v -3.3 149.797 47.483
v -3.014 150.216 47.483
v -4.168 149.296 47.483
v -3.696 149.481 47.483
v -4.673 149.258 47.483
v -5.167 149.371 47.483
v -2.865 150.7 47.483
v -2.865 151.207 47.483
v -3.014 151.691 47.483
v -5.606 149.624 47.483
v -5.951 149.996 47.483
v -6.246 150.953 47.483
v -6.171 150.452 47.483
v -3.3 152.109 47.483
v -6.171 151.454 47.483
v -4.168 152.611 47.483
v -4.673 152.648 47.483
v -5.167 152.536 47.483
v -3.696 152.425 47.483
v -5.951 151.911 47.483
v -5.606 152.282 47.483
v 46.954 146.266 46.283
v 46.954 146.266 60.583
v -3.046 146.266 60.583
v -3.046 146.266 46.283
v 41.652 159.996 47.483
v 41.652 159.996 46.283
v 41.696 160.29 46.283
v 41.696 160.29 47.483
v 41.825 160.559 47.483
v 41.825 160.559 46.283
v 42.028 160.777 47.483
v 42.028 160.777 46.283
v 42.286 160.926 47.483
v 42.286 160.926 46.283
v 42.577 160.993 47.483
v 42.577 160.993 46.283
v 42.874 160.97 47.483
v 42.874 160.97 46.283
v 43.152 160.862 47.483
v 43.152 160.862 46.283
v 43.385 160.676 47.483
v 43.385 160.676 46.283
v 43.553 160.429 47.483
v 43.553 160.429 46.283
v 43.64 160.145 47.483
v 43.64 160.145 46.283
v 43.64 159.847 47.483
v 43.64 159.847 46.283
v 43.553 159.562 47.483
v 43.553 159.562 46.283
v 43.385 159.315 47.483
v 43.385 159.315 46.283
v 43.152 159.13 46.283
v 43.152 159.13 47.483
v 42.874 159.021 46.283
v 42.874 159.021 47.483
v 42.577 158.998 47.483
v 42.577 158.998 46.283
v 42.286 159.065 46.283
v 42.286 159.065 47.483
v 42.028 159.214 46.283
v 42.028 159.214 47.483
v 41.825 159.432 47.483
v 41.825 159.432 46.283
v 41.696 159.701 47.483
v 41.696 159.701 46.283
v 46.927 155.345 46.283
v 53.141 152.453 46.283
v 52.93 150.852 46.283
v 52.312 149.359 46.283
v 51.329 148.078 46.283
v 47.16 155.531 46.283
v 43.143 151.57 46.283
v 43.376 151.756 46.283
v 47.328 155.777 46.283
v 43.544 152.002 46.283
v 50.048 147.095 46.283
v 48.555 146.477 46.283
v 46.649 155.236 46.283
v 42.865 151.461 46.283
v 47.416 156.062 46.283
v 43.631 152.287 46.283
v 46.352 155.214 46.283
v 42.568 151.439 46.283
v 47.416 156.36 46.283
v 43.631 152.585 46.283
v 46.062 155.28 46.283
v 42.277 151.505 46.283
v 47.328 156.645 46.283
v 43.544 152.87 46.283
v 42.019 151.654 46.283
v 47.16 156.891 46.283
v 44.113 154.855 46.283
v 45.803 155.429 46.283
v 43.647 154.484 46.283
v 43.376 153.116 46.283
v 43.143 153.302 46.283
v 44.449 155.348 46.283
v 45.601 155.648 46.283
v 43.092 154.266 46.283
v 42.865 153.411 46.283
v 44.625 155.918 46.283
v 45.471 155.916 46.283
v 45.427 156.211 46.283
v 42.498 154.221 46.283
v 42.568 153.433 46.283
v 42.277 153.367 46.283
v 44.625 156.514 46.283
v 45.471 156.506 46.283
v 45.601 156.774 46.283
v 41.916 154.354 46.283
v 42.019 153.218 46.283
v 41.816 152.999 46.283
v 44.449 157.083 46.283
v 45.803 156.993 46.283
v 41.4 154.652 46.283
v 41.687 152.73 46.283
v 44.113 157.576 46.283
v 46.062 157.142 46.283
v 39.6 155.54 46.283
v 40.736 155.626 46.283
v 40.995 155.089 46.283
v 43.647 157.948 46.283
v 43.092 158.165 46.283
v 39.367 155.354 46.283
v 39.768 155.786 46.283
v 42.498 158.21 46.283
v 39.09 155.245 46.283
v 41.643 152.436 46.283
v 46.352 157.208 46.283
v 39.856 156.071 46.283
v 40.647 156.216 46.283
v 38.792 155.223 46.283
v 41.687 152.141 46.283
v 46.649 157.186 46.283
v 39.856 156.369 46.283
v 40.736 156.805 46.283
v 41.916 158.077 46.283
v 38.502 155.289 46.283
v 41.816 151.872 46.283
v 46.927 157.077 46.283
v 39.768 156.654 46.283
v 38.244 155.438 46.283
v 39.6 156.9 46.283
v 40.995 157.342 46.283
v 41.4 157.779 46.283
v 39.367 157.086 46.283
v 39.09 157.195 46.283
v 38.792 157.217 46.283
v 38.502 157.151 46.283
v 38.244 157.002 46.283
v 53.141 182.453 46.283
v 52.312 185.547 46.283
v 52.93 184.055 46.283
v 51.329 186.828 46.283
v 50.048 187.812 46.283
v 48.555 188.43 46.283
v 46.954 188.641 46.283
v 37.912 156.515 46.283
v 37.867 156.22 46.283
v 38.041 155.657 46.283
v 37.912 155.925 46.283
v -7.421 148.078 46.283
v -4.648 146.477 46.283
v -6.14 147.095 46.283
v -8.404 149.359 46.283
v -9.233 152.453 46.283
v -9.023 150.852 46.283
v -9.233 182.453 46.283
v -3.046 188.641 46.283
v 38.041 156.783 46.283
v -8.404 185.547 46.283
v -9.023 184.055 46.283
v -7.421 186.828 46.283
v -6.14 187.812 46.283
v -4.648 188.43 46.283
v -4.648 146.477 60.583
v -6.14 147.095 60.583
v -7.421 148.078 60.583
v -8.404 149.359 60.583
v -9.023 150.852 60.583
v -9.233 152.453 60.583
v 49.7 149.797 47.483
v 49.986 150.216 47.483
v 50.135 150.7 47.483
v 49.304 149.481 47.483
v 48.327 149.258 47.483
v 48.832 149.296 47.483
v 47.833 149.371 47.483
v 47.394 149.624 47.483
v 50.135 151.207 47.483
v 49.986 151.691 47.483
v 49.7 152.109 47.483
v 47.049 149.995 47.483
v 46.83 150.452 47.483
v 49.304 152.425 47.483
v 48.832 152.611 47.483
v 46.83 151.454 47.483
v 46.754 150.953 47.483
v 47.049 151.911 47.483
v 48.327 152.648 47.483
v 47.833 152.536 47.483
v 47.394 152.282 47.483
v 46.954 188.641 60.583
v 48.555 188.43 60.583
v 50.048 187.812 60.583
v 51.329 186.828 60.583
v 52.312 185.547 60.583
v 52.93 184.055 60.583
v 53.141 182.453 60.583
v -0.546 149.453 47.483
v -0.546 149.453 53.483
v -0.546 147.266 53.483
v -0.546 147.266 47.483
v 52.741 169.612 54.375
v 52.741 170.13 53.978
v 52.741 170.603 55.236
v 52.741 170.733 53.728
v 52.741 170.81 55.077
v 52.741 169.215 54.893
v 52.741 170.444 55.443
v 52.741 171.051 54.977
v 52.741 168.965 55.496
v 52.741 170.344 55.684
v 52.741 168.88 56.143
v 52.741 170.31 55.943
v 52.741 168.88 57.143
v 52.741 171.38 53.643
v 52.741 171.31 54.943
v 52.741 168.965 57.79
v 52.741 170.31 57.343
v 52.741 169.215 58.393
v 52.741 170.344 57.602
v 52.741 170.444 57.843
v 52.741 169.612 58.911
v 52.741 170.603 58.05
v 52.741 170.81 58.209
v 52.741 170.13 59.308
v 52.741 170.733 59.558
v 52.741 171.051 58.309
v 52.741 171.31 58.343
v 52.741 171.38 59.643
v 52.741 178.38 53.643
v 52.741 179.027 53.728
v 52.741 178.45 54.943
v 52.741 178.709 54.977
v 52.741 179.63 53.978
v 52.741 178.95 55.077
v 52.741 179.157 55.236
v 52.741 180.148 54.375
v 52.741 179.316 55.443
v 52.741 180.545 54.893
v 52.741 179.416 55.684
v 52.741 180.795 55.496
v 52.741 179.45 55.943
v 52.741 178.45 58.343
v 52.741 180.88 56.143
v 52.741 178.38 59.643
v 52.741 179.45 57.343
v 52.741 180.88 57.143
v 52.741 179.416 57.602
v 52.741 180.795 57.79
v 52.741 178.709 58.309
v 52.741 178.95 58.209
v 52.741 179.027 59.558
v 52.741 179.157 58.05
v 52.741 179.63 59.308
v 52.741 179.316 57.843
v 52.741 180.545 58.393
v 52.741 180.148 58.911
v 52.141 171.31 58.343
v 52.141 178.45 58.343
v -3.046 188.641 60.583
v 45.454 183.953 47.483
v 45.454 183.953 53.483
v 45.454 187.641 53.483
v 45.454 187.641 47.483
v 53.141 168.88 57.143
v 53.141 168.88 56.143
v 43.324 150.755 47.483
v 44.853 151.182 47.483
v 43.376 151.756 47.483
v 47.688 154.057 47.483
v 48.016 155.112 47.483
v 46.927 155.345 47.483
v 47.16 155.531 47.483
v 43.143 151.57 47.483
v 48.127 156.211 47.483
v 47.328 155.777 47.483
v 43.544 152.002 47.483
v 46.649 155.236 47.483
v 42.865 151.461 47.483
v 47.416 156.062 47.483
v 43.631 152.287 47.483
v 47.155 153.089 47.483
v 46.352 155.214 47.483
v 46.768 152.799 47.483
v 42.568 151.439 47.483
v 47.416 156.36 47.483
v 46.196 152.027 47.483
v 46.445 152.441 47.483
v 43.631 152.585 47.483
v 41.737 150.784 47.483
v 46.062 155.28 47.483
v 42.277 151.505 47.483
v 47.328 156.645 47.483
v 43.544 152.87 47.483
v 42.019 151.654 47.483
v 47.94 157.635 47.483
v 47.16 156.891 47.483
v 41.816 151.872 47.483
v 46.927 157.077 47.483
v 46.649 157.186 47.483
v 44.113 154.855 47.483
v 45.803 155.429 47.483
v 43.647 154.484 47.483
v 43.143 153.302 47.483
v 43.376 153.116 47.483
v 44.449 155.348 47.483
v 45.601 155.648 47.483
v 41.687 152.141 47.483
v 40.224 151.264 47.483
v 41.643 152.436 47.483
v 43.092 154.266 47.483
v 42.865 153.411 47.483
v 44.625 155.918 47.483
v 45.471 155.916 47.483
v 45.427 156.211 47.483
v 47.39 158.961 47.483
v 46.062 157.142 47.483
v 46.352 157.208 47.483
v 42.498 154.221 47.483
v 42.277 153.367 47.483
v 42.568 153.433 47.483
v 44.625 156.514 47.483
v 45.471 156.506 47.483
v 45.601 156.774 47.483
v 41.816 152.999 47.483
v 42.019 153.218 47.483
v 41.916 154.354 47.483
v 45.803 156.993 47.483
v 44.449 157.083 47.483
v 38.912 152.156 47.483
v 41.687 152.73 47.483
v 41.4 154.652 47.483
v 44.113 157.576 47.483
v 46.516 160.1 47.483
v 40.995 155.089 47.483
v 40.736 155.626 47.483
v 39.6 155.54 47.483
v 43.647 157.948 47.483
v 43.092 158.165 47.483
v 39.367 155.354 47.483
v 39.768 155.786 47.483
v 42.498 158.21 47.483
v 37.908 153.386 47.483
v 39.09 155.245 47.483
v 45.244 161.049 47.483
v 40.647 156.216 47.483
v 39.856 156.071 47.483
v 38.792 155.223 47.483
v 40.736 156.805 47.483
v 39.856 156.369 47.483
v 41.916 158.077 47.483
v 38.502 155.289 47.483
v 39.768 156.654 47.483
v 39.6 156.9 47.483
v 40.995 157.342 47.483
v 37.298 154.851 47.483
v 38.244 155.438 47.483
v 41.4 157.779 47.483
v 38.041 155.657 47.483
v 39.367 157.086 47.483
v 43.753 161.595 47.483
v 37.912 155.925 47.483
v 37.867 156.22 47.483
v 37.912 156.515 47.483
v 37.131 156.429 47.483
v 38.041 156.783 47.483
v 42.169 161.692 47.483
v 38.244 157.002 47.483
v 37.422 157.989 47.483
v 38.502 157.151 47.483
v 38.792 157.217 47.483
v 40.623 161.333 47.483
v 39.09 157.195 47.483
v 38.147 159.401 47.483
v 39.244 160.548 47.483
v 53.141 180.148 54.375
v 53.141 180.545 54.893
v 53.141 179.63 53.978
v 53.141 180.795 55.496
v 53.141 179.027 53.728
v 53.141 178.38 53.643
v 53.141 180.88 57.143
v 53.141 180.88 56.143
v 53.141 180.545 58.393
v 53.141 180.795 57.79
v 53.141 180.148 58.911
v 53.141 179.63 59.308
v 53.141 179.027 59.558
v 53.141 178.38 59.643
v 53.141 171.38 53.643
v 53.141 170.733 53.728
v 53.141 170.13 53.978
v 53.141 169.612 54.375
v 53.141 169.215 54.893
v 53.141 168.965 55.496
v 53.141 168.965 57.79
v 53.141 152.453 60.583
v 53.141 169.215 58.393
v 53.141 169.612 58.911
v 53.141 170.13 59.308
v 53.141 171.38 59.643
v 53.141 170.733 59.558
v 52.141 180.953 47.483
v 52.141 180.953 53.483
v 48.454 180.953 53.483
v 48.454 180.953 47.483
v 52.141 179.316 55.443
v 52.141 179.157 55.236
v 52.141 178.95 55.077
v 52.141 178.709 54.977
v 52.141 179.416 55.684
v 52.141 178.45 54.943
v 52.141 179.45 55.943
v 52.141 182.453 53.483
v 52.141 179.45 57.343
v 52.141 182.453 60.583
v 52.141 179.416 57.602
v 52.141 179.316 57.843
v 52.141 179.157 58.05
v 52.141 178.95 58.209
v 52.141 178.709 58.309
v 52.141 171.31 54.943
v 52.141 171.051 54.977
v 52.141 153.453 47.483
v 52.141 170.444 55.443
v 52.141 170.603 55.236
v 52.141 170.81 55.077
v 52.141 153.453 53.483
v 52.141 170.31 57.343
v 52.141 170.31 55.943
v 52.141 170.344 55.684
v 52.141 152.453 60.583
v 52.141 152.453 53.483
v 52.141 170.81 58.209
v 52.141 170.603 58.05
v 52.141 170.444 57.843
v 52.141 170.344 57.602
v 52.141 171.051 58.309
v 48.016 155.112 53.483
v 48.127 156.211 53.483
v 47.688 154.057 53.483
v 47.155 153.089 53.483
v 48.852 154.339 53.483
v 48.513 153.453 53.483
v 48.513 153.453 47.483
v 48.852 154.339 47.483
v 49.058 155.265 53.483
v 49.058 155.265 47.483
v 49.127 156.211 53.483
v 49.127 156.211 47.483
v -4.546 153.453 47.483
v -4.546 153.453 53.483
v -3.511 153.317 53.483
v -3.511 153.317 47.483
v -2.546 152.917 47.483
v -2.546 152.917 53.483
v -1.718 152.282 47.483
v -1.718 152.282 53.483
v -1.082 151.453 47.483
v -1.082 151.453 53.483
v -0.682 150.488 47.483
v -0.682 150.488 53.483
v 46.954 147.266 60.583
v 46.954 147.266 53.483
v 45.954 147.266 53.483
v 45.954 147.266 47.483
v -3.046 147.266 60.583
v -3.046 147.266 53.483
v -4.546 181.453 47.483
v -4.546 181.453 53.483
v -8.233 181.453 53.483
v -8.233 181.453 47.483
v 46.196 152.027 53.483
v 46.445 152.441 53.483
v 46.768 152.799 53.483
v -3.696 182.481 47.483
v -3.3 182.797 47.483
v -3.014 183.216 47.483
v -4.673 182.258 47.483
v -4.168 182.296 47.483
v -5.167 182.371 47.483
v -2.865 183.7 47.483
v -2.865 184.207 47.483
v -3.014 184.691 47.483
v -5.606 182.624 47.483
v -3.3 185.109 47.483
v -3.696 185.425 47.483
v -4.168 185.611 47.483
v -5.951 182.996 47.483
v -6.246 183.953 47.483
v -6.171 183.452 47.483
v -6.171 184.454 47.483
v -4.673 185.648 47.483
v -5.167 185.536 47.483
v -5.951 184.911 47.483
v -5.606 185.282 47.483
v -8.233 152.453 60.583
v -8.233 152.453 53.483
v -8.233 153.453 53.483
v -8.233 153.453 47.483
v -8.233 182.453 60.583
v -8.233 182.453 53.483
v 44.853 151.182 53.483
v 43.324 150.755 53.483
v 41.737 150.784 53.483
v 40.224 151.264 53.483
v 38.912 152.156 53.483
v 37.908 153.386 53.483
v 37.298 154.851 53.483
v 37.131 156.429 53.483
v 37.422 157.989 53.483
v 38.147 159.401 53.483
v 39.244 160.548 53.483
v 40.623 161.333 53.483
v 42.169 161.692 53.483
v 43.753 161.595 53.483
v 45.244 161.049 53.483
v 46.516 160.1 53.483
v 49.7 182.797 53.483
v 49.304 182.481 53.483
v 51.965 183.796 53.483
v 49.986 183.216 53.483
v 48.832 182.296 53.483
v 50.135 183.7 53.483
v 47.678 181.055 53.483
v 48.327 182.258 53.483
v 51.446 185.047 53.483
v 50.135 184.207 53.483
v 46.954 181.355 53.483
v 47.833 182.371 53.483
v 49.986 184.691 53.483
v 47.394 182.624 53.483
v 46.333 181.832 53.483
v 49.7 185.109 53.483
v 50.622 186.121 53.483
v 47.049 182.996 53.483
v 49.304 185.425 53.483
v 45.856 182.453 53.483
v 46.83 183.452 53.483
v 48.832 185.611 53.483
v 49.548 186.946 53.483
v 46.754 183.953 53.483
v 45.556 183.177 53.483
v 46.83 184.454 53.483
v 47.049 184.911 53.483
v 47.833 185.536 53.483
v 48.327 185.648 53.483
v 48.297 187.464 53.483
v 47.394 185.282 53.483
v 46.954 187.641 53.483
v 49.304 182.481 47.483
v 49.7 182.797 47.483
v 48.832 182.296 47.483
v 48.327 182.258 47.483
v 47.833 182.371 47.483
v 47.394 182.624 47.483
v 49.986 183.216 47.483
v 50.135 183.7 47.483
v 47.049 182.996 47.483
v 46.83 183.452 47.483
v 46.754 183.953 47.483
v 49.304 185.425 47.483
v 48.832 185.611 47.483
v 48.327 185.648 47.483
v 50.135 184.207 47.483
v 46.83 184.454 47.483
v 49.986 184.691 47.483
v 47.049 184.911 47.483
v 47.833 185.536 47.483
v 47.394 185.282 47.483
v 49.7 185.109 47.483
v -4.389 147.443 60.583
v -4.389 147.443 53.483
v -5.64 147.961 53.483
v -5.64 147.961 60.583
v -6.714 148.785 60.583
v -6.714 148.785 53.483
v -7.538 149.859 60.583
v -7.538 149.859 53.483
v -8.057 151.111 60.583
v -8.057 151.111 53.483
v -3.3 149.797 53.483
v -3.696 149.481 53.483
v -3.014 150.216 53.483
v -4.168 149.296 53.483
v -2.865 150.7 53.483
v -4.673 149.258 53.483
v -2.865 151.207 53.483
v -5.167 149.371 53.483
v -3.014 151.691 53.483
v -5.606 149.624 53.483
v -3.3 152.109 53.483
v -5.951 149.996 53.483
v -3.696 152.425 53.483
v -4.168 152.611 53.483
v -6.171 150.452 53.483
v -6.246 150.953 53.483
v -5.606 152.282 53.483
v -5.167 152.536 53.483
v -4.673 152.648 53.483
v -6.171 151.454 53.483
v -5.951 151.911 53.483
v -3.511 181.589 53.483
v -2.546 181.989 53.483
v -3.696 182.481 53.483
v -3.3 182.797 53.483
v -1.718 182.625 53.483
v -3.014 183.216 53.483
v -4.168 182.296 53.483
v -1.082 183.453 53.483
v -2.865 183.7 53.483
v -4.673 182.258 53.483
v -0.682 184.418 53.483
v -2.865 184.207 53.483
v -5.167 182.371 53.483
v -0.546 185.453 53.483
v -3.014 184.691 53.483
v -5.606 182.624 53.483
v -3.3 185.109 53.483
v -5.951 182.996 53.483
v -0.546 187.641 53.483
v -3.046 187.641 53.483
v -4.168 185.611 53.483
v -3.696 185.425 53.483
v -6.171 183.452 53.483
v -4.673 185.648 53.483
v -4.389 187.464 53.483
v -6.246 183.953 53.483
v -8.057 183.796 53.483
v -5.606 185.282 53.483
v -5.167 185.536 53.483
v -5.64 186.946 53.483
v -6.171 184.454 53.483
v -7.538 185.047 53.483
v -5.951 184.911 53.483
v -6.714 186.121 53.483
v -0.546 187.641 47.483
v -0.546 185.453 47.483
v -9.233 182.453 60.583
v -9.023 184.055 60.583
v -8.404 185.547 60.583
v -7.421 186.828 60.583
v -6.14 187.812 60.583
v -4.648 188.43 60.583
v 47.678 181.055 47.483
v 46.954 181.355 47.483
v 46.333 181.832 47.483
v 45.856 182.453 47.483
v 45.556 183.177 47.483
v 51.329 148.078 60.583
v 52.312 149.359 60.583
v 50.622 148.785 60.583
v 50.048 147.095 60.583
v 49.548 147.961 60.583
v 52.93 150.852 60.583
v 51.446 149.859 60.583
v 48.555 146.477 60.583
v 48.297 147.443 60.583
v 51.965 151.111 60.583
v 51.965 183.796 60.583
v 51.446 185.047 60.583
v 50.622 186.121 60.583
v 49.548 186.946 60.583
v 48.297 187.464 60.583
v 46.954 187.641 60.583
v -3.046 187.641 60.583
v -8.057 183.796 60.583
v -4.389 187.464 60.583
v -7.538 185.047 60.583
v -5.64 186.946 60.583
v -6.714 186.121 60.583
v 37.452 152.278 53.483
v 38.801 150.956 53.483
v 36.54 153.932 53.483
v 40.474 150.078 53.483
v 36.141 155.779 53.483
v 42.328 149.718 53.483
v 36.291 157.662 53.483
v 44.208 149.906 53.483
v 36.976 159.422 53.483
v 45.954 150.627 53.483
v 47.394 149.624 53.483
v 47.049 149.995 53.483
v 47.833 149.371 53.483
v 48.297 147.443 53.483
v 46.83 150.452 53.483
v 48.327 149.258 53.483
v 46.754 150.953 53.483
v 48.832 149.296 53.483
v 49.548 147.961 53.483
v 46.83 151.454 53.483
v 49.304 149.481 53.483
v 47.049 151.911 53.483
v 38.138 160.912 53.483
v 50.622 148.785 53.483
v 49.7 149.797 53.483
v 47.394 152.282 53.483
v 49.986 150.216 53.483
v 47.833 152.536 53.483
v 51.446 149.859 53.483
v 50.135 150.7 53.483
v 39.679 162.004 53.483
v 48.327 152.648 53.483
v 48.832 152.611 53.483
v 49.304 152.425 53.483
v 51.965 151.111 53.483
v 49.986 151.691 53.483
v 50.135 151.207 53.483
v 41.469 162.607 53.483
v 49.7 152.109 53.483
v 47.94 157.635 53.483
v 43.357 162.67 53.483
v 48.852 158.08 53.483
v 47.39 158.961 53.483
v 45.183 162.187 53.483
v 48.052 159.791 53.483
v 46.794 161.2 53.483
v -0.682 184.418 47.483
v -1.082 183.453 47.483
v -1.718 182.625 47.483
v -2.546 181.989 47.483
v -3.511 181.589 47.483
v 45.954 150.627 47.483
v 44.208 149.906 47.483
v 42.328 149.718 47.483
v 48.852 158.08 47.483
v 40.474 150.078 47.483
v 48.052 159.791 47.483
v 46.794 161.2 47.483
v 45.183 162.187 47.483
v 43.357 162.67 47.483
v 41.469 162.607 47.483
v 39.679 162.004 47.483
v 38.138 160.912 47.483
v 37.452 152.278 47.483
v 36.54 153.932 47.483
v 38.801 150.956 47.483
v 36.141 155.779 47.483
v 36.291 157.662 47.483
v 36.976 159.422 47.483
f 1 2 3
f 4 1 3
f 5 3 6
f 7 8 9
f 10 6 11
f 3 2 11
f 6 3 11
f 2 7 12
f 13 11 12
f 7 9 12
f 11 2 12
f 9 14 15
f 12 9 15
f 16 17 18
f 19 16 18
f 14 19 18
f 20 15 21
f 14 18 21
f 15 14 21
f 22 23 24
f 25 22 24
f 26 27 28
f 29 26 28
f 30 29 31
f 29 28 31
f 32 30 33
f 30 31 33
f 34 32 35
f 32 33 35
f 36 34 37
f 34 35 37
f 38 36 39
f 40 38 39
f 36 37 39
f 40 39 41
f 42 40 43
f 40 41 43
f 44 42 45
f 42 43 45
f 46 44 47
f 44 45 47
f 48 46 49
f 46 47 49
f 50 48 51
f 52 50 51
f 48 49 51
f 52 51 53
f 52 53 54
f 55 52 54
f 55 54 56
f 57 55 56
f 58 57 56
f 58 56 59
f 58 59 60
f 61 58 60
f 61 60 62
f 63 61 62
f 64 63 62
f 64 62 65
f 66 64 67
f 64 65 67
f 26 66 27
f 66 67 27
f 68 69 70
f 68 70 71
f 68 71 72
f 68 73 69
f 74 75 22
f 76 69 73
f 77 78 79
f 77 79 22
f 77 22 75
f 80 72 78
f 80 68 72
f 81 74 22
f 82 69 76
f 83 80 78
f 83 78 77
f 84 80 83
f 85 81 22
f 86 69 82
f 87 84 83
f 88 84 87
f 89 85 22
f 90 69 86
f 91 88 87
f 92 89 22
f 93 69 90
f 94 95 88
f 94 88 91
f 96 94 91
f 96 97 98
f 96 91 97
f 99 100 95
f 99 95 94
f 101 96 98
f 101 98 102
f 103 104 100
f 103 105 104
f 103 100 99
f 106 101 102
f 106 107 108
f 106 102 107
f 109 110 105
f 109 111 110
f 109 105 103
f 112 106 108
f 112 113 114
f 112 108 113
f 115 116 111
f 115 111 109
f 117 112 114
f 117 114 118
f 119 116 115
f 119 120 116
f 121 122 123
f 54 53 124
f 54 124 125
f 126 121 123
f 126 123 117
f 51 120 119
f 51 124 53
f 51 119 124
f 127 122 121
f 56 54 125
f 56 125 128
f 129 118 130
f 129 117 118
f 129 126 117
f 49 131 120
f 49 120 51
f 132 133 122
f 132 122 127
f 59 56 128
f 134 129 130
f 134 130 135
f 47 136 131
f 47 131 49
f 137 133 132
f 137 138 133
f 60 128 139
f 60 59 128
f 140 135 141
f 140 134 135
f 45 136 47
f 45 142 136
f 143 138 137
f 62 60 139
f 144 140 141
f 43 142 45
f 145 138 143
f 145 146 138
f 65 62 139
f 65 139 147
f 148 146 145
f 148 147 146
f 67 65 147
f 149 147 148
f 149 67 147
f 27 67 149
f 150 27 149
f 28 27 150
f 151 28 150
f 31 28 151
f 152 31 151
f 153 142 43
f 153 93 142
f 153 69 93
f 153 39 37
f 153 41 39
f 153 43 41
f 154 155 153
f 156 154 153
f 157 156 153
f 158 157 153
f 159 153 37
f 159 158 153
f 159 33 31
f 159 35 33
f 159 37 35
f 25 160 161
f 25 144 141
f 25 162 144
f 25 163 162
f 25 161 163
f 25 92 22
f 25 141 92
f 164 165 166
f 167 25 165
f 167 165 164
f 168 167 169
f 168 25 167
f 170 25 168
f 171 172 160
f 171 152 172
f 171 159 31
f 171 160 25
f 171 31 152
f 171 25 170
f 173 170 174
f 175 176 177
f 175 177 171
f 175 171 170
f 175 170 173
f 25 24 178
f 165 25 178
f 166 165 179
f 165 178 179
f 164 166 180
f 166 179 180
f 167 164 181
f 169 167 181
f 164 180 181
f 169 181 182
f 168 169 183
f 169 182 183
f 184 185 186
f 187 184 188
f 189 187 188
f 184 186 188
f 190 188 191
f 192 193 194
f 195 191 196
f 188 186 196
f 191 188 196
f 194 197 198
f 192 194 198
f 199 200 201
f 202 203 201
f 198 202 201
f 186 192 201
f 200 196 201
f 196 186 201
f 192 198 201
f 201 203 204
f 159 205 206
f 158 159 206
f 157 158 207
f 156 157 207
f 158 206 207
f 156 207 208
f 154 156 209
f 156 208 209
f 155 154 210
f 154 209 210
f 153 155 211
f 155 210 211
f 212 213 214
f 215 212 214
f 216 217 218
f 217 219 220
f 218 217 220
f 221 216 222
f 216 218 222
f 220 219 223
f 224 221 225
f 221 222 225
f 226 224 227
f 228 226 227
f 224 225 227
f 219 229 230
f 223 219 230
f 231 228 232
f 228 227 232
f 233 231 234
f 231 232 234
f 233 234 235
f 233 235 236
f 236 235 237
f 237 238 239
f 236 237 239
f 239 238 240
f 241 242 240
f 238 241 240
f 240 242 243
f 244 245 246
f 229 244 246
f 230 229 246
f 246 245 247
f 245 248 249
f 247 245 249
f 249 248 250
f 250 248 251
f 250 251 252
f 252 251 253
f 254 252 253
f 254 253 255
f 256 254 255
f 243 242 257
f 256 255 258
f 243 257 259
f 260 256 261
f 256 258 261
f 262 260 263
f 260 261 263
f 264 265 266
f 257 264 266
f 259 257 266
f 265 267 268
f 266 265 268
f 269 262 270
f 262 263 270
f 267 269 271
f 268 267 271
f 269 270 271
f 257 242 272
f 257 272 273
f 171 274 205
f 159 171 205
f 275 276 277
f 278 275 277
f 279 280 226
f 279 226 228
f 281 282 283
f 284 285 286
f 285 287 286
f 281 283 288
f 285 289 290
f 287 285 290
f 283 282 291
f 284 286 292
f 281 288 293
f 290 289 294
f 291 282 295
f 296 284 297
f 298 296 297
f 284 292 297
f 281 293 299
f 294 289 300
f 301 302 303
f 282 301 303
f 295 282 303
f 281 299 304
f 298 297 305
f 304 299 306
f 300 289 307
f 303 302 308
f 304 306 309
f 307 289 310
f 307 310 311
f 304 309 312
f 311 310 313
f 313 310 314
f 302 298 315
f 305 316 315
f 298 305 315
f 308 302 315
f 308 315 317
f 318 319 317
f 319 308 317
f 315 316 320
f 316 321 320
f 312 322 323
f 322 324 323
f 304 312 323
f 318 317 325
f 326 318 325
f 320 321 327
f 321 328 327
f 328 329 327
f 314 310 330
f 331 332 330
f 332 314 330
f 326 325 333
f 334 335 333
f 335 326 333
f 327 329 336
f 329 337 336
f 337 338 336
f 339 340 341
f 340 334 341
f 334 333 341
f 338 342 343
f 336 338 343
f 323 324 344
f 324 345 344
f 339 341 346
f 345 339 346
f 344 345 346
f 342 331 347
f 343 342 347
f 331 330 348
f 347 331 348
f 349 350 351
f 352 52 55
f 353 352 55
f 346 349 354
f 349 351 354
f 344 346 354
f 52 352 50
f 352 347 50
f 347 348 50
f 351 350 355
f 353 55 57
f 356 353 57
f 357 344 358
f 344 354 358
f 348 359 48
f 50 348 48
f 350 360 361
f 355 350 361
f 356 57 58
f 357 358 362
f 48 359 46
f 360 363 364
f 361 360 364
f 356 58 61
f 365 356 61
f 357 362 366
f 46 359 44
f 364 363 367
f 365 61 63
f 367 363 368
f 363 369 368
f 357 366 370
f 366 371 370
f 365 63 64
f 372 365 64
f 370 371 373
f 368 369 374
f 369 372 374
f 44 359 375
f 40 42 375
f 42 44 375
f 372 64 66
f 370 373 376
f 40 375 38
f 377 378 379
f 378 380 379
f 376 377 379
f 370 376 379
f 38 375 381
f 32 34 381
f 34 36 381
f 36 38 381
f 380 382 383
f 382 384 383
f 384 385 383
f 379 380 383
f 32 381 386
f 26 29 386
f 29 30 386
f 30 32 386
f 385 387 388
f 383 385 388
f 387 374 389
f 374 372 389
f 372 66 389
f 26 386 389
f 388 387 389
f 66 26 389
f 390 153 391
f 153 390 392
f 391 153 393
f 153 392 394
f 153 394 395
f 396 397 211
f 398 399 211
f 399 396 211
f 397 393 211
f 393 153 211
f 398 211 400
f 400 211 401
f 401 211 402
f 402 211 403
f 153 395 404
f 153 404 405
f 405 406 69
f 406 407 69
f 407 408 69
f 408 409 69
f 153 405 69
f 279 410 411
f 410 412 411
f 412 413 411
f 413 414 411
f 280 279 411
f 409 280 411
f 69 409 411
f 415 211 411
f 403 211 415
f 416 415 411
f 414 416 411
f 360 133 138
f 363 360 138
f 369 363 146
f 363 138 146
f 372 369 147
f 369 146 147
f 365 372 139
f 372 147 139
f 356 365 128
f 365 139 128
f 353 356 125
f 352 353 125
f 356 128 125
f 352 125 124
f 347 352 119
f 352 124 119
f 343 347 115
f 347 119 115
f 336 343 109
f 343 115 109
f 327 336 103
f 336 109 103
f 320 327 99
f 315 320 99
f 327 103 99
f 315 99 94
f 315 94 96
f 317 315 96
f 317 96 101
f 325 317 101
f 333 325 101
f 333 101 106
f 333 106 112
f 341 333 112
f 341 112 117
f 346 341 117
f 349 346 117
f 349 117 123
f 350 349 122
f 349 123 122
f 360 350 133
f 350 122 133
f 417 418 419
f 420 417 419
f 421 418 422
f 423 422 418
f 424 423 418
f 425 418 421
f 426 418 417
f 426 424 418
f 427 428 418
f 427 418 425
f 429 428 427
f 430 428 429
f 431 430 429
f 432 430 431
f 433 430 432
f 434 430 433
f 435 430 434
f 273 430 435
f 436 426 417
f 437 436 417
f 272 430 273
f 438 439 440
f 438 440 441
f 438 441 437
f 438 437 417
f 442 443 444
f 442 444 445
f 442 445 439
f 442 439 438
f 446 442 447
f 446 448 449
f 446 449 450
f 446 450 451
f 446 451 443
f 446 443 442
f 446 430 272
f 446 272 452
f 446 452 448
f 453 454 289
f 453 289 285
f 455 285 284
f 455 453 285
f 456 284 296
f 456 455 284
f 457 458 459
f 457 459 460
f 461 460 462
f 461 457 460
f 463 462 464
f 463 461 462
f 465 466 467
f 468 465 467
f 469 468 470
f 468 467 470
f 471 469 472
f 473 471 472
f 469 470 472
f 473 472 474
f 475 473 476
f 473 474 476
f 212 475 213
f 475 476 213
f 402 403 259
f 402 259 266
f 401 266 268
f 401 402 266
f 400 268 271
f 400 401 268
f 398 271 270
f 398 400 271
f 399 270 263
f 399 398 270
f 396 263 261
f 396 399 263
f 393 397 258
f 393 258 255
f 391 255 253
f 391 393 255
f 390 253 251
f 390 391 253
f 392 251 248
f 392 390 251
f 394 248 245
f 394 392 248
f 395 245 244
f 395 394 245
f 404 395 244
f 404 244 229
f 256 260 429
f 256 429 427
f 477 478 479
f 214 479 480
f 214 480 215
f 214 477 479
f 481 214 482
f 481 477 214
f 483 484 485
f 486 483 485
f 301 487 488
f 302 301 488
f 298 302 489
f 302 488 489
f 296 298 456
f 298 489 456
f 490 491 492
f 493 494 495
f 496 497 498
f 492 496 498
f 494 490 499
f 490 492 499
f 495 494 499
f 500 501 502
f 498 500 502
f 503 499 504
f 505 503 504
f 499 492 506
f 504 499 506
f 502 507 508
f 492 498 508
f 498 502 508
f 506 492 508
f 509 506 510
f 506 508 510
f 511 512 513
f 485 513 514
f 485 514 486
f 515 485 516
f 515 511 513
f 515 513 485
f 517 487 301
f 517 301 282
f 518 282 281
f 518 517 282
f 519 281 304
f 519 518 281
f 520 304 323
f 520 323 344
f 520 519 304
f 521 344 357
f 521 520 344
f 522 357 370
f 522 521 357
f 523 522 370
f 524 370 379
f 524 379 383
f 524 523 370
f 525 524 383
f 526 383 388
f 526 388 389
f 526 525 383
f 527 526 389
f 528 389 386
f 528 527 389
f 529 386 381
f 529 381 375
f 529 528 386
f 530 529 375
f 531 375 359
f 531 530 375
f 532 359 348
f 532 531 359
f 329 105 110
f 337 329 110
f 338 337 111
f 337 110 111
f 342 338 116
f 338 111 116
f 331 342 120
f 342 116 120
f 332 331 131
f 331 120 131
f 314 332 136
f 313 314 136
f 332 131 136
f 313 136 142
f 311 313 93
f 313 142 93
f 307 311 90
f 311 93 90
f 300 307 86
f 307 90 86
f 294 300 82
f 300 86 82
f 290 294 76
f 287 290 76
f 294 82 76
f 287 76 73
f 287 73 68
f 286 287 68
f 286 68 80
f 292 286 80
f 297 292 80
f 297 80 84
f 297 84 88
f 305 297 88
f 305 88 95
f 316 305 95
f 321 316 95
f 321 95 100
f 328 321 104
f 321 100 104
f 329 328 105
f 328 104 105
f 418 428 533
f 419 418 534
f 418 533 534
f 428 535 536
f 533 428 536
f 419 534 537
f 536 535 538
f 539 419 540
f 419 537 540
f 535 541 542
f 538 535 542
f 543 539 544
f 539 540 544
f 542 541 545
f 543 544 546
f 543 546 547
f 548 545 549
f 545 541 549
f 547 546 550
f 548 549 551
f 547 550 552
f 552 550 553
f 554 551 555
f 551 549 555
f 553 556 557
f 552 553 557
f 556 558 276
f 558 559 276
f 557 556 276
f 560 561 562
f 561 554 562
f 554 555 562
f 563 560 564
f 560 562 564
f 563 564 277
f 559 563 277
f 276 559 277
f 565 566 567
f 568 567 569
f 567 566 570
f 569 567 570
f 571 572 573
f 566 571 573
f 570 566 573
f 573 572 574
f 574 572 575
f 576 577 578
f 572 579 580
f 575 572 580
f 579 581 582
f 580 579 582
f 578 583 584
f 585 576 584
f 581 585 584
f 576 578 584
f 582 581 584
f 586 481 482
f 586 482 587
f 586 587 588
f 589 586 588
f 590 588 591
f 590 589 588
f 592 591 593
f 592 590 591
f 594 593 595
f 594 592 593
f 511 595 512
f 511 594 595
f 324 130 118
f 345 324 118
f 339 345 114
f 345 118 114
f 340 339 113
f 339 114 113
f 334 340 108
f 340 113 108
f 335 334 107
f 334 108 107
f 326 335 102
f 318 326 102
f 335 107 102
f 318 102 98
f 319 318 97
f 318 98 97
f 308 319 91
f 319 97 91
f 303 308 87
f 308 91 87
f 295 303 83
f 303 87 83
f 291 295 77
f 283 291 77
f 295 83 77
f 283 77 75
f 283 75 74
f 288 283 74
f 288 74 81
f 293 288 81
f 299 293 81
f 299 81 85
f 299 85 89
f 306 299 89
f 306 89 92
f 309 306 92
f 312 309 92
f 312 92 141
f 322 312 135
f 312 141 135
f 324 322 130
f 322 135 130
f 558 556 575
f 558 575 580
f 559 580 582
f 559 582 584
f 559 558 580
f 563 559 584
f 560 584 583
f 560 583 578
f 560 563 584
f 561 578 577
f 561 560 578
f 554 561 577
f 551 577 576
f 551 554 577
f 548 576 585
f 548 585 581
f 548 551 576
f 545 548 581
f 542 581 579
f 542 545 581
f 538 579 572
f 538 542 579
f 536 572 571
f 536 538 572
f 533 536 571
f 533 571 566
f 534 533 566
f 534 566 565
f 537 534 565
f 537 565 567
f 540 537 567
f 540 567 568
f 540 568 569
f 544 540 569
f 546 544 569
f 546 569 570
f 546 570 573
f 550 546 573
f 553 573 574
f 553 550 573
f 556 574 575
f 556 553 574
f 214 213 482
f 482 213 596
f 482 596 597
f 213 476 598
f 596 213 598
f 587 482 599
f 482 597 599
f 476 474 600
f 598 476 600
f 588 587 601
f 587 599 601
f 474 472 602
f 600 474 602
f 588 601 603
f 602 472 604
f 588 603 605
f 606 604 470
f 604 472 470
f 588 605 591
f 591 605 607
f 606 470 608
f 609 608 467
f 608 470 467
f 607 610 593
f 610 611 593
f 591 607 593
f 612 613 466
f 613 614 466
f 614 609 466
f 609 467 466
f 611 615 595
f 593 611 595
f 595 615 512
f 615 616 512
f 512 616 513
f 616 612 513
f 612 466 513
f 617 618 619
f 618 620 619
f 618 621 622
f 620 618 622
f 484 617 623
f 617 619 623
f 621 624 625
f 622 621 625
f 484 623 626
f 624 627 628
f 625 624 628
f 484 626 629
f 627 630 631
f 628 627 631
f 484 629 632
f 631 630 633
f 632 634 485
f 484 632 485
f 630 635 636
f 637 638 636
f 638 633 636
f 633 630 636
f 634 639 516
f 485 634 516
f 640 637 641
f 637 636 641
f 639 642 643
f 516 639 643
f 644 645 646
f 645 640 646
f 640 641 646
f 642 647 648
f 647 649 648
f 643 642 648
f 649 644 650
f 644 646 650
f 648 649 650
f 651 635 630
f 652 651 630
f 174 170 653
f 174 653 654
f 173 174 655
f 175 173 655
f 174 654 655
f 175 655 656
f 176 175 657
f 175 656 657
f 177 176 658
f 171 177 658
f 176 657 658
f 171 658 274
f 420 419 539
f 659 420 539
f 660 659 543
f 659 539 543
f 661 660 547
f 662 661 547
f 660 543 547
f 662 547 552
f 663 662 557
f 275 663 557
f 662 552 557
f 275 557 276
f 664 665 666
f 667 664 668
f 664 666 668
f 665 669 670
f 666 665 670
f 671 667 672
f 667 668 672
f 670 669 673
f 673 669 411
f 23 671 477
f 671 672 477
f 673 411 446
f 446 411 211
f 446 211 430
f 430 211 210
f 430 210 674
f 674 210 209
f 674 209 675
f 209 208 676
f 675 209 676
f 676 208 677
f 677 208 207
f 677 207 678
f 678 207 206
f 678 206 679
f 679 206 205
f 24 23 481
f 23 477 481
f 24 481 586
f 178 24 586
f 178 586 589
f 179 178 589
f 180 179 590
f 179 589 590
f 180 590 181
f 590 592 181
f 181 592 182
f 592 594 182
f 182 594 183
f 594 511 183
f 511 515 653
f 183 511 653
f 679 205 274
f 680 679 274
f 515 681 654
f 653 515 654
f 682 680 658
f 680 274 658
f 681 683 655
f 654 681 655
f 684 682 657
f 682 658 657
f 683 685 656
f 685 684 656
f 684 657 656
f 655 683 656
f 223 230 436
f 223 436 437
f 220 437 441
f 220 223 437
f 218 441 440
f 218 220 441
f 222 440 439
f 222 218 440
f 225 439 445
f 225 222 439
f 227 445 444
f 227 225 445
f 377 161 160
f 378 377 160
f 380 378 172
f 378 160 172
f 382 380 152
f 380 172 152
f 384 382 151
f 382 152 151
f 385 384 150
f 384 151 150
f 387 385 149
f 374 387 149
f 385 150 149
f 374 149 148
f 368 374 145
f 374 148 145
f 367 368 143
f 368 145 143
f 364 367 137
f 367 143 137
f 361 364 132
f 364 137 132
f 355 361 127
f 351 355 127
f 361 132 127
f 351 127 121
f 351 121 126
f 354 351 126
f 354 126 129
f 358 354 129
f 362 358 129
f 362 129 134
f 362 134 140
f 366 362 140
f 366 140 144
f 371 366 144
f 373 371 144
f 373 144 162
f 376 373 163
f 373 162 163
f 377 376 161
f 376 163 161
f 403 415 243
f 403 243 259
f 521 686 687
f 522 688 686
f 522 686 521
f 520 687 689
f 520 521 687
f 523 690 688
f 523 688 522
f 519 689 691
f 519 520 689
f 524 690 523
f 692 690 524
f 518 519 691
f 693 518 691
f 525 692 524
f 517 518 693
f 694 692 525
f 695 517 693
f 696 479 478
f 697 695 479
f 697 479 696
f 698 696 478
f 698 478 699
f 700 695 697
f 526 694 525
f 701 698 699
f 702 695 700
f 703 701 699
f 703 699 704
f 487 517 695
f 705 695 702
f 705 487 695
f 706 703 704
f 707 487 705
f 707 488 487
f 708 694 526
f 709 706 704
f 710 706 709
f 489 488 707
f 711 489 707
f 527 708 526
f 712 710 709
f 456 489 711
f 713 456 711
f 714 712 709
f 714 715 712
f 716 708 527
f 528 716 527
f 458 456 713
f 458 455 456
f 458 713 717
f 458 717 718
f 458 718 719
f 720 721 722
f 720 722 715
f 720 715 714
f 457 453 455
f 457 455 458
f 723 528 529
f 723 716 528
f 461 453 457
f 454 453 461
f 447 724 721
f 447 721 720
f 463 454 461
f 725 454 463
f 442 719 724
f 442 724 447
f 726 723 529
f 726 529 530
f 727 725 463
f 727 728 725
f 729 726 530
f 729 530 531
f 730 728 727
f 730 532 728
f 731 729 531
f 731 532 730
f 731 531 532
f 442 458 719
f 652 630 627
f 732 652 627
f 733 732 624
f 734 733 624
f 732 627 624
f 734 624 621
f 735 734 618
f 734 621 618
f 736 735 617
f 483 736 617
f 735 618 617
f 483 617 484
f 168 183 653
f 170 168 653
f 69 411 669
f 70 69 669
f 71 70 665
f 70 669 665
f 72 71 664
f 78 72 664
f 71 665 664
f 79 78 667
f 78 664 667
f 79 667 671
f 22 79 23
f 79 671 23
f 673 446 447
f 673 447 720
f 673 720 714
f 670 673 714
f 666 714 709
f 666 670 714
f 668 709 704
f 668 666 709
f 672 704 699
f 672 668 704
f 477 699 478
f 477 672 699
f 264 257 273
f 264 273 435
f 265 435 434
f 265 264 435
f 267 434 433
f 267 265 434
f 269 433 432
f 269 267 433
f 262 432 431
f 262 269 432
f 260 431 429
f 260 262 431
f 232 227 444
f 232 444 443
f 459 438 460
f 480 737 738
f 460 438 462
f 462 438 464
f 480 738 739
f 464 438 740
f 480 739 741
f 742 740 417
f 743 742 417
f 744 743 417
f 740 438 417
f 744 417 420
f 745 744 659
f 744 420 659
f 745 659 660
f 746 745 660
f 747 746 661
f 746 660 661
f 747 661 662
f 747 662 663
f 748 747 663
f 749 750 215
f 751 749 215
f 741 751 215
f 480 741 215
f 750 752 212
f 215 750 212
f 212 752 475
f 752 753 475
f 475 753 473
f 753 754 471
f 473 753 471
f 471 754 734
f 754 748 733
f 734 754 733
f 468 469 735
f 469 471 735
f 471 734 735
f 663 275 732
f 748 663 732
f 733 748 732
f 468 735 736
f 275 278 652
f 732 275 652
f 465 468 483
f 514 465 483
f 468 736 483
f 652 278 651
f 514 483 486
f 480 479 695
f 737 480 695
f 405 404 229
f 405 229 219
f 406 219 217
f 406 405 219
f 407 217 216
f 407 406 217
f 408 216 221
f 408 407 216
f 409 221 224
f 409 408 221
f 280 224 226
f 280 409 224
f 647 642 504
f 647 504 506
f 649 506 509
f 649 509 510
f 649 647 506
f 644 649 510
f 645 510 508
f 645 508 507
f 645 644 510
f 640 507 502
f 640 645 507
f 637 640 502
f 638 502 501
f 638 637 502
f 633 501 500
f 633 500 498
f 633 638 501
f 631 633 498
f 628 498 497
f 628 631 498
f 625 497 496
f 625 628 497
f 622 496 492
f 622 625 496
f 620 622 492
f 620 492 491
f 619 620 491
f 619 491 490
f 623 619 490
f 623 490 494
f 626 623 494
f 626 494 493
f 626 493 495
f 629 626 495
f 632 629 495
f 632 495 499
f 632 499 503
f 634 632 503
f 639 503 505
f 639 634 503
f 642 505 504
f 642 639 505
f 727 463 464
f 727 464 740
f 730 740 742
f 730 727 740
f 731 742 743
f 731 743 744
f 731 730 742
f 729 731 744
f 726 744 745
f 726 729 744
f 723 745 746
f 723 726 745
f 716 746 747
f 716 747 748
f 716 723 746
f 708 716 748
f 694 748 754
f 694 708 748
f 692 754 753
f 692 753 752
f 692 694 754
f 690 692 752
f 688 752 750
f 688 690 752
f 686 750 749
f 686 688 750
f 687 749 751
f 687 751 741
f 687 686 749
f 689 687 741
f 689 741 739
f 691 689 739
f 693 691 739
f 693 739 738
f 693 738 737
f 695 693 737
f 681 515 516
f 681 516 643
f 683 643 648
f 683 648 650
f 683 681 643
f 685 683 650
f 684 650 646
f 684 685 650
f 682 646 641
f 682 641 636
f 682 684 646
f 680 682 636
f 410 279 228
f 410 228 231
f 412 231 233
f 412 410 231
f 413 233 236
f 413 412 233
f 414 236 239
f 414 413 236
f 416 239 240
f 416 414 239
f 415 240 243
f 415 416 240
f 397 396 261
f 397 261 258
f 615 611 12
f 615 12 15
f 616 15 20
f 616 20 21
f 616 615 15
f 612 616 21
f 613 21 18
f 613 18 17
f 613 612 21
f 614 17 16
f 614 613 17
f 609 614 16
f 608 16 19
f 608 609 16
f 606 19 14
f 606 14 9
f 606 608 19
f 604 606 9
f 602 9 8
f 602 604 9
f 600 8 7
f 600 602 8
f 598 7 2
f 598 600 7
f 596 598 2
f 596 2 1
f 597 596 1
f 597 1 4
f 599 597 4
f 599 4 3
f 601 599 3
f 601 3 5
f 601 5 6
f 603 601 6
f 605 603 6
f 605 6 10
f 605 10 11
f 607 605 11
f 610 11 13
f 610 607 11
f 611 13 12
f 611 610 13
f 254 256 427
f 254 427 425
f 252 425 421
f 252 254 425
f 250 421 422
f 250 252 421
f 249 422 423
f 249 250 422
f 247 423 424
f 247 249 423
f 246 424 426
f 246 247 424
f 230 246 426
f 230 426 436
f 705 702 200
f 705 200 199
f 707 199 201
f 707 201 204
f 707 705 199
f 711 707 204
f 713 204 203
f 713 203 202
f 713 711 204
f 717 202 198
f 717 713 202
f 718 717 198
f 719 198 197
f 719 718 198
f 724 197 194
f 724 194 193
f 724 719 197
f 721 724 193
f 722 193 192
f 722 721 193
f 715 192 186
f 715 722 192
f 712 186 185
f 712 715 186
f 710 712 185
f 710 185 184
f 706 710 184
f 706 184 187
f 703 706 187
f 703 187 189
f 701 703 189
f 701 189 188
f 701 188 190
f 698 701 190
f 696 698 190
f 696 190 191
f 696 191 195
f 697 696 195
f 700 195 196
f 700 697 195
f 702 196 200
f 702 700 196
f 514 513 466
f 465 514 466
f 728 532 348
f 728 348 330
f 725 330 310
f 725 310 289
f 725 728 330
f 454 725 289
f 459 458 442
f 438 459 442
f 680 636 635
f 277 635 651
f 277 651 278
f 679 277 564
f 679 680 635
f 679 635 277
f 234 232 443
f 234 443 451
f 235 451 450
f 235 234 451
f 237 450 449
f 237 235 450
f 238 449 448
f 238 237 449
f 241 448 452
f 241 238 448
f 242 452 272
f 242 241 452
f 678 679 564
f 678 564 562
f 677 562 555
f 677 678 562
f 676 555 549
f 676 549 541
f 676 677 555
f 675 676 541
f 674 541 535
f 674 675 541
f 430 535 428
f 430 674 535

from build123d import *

# Parameters (mm, degrees)
SKETCH_10_R         = 1.7
EXTRUDE_5_DEPTH     = 6
EXTRUDE_6_DEPTH     = 1.2
EXTRUDE_START       = -7.1
EXTRUDE_7_DEPTH     = 7.1
CUT_EXTRUDE_3_REACH = 209.716
CUT_EXTRUDE_4_DEPTH = 0.4
EXTRUDE_START_2     = 6
EXTRUDE_8_DEPTH     = 6
SKETCH_15_R         = 2
SKETCH_15_R_2       = 1
CUT_EXTRUDE_5_DEPTH = 1.2


with BuildPart() as part:
    # 草图10 → 凸台-拉伸5 (new body)
    with BuildSketch(Plane(origin=(0, 0, 53.48299881), x_dir=(-1, 0, 0), z_dir=(0, 0, -1))):
        with BuildLine():
            ThreePointArc((9.233430205, 182.453191023), (7.421209024, 186.828279976), (3.04612007, 188.640501158))
            Line((3.04612007, 188.640501158), (-46.95397899, 188.640501158))
            ThreePointArc((-46.95397899, 188.640501158), (-51.329067943, 186.828279976), (-53.141289124, 182.453191023))
            Line((-53.141289124, 182.453191023), (-53.141289124, 152.453132603))
            ThreePointArc((-53.141289124, 152.453132603), (-51.329067943, 148.078043649), (-46.95397899, 146.265822468))
            Line((-46.95397899, 146.265822468), (3.04612007, 146.265822468))
            ThreePointArc((3.04612007, 146.265822468), (7.421209024, 148.078043649), (9.233430205, 152.453132603))
            Line((9.233430205, 152.453132603), (9.233430205, 182.453191023))
        make_face()
        with BuildLine():
            ThreePointArc((0.54612261, 185.453196103), (1.717695486, 182.624768978), (4.54612261, 181.453196103))
            Line((4.54612261, 181.453196103), (8.233430205, 181.453196103))
            Line((8.233430205, 181.453196103), (8.233430205, 153.453127523))
            Line((8.233430205, 153.453127523), (4.54612261, 153.453127523))
            ThreePointArc((4.54612261, 153.453127523), (1.717695486, 152.281554648), (0.54612261, 149.453127523))
            Line((0.54612261, 149.453127523), (0.54612261, 147.265822468))
            Line((0.54612261, 147.265822468), (-45.95398153, 147.265822468))
            Line((-45.95398153, 147.265822468), (-45.95398153, 150.953127523))
            ThreePointArc((-45.95398153, 150.953127523), (-46.686214577, 152.720894476), (-48.45398153, 153.453127523))
            Line((-48.45398153, 153.453127523), (-52.141289124, 153.453127523))
            Line((-52.141289124, 153.453127523), (-52.141289124, 180.953183403))
            Line((-52.141289124, 180.953183403), (-48.45399423, 180.953183403))
            ThreePointArc((-48.45399423, 180.953183403), (-46.332673886, 181.831863059), (-45.45399423, 183.953183403))
            Line((-45.45399423, 183.953183403), (-45.45399423, 187.640501158))
            Line((-45.45399423, 187.640501158), (0.54612261, 187.640501158))
            Line((0.54612261, 187.640501158), (0.54612261, 185.453196103))
        make_face(mode=Mode.SUBTRACT)
        with Locations((4.54610737, 183.953163083)):
            Circle(SKETCH_10_R, mode=Mode.SUBTRACT)
        with Locations((-48.45399423, 183.953183403)):
            Circle(SKETCH_10_R, mode=Mode.SUBTRACT)
        with Locations((-48.45399423, 150.953140223)):
            Circle(SKETCH_10_R, mode=Mode.SUBTRACT)
        with Locations((4.54610737, 150.953160543)):
            Circle(SKETCH_10_R, mode=Mode.SUBTRACT)
    extrude(amount=EXTRUDE_5_DEPTH)

    # 草图11 → 凸台-拉伸6 (add)
    with BuildSketch(Plane(origin=(0, 0, 47.48299881), x_dir=(-1, 0, 0), z_dir=(0, 0, -1))):
        with BuildLine():
            Line((9.233430205, 152.453132603), (9.233430205, 182.453191023))
            ThreePointArc((9.233430205, 182.453191023), (7.421209024, 186.828279976), (3.04612007, 188.640501158))
            Line((3.04612007, 188.640501158), (-46.95397899, 188.640501158))
            ThreePointArc((-46.95397899, 188.640501158), (-51.329067943, 186.828279976), (-53.141289124, 182.453191023))
            Line((-53.141289124, 182.453191023), (-53.141289124, 152.453132603))
            ThreePointArc((-53.141289124, 152.453132603), (-51.329067943, 148.078043649), (-46.95397899, 146.265822468))
            Line((-46.95397899, 146.265822468), (3.04612007, 146.265822468))
            ThreePointArc((3.04612007, 146.265822468), (7.421209024, 148.078043649), (9.233430205, 152.453132603))
        make_face()
    extrude(amount=EXTRUDE_6_DEPTH)

    # 草图10<4> → 凸台-拉伸7 (add)
    with BuildSketch(Plane(origin=(0, 0, 53.48299881), x_dir=(-1, 0, 0), z_dir=(0, 0, -1)).offset(EXTRUDE_START)):
        with BuildLine():
            Line((9.233430205, 152.453132603), (9.233430205, 182.453191023))
            ThreePointArc((9.233430205, 182.453191023), (7.421209024, 186.828279976), (3.04612007, 188.640501158))
            Line((3.04612007, 188.640501158), (-46.95397899, 188.640501158))
            ThreePointArc((-46.95397899, 188.640501158), (-51.329067943, 186.828279976), (-53.141289124, 182.453191023))
            Line((-53.141289124, 182.453191023), (-53.141289124, 152.453132603))
            ThreePointArc((-53.141289124, 152.453132603), (-51.329067943, 148.078043649), (-46.95397899, 146.265822468))
            Line((-46.95397899, 146.265822468), (3.04612007, 146.265822468))
            ThreePointArc((3.04612007, 146.265822468), (7.421209024, 148.078043649), (9.233430205, 152.453132603))
        make_face()
        with BuildLine():
            ThreePointArc((8.233430205, 182.453191023), (6.714102243, 186.121173195), (3.04612007, 187.640501158))
            Line((3.04612007, 187.640501158), (-46.95397899, 187.640501158))
            ThreePointArc((-46.95397899, 187.640501158), (-50.621961162, 186.121173195), (-52.141289124, 182.453191023))
            Line((-52.141289124, 182.453191023), (-52.141289124, 152.453132603))
            ThreePointArc((-52.141289124, 152.453132603), (-50.621961162, 148.78515043), (-46.95397899, 147.265822468))
            Line((-46.95397899, 147.265822468), (3.04612007, 147.265822468))
            ThreePointArc((3.04612007, 147.265822468), (6.714102243, 148.78515043), (8.233430205, 152.453132603))
            Line((8.233430205, 152.453132603), (8.233430205, 182.453191023))
        make_face(mode=Mode.SUBTRACT)
    extrude(amount=EXTRUDE_7_DEPTH)

    # 草图12 → 切除-拉伸3 (cut, up to next)
    with BuildSketch(Plane(origin=(53.141289124, 0, 0), x_dir=(0, 0, -1), z_dir=(1, 0, 0)), mode=Mode.PRIVATE) as cut_extrude_3_sk1:
        with BuildLine():
            Line((-57.343049783, 179.450176225), (-55.943049648, 179.450176225))
            ThreePointArc((-55.943049648, 179.450176225), (-55.235942867, 179.157283006), (-54.943049648, 178.450176225))
            Line((-54.943049648, 178.450176225), (-54.943049648, 171.310175849))
            ThreePointArc((-54.943049648, 171.310175849), (-55.235942867, 170.603069068), (-55.943049648, 170.310175849))
            Line((-55.943049648, 170.310175849), (-57.343049783, 170.310175849))
            ThreePointArc((-57.343049783, 170.310175849), (-58.050156564, 170.603069068), (-58.343049783, 171.310175849))
            Line((-58.343049783, 171.310175849), (-58.343049783, 178.450176225))
            ThreePointArc((-58.343049783, 178.450176225), (-58.050156564, 179.157283006), (-57.343049783, 179.450176225))
        make_face()
    cut_extrude_3_tool1 = extrude(cut_extrude_3_sk1.sketch, amount=-CUT_EXTRUDE_3_REACH, mode=Mode.PRIVATE) & part.part
    add(cut_extrude_3_tool1.solids().sort_by_distance((53.141289, 174.880176, 56.64305))[0], mode=Mode.SUBTRACT)

    # 草图13 → 切除-拉伸4 (cut)
    with BuildSketch(Plane(origin=(53.141289124, 0, 0), x_dir=(0, 0, -1), z_dir=(1, 0, 0))):
        with BuildLine():
            Line((-57.143049715, 180.880176037), (-56.143049715, 180.880176037))
            ThreePointArc((-56.143049715, 180.880176037), (-54.375282762, 180.14794299), (-53.643049715, 178.380176037))
            Line((-53.643049715, 178.380176037), (-53.643049715, 171.380176037))
            ThreePointArc((-53.643049715, 171.380176037), (-54.375282762, 169.612409084), (-56.143049715, 168.880176037))
            Line((-56.143049715, 168.880176037), (-57.143049715, 168.880176037))
            ThreePointArc((-57.143049715, 168.880176037), (-58.910816668, 169.612409084), (-59.643049715, 171.380176037))
            Line((-59.643049715, 171.380176037), (-59.643049715, 178.380176037))
            ThreePointArc((-59.643049715, 178.380176037), (-58.910816668, 180.14794299), (-57.143049715, 180.880176037))
        make_face()
    extrude(amount=-CUT_EXTRUDE_4_DEPTH, mode=Mode.SUBTRACT)

    # 草图14 → 凸台-拉伸8 (add)
    with BuildSketch(Plane.XY.offset(47.48299881).offset(EXTRUDE_START_2)):
        with BuildLine():
            ThreePointArc((46.196138585, 152.026507807), (37.131275676, 156.428908647), (46.516064334, 160.100231917))
            ThreePointArc((46.516064334, 160.100231917), (47.708316282, 158.315900782), (48.12697949, 156.211138699))
            ThreePointArc((48.12697949, 156.211138699), (47.878381245, 154.576273637), (47.155059599, 153.089199108))
            ThreePointArc((47.155059599, 153.089199108), (47.779510983, 153.360426732), (48.45398153, 153.453127523))
            Line((48.45398153, 153.453127523), (48.512842608, 153.453127523))
            ThreePointArc((48.512842608, 153.453127523), (48.971587844, 154.79835866), (49.12697949, 156.211138699))
            ThreePointArc((49.12697949, 156.211138699), (36.975612676, 159.422408955), (45.95398153, 150.627133812))
            Line((45.95398153, 150.627133812), (45.95398153, 150.953127523))
            ThreePointArc((45.95398153, 150.953127523), (46.0152721, 151.503305965), (46.196138585, 152.026507807))
        make_face()
    extrude(amount=-EXTRUDE_8_DEPTH)

    # 草图15 → 切除-拉伸5 (cut)
    with BuildSketch(Plane(origin=(0, 0, 46.28299881), x_dir=(-1, 0, 0), z_dir=(0, 0, -1))):
        with Locations((-42.647049867, 156.215638701)):
            Circle(SKETCH_15_R)
        with Locations((-46.426971116, 156.211138699)):
            Circle(SKETCH_15_R_2)
        with Locations((-42.651549869, 159.995559949)):
            Circle(SKETCH_15_R_2)
        with Locations((-38.867128618, 156.220138702)):
            Circle(SKETCH_15_R_2)
        with Locations((-42.642549865, 152.435717452)):
            Circle(SKETCH_15_R_2)
    extrude(amount=-CUT_EXTRUDE_5_DEPTH, mode=Mode.SUBTRACT)


solid = part.part
